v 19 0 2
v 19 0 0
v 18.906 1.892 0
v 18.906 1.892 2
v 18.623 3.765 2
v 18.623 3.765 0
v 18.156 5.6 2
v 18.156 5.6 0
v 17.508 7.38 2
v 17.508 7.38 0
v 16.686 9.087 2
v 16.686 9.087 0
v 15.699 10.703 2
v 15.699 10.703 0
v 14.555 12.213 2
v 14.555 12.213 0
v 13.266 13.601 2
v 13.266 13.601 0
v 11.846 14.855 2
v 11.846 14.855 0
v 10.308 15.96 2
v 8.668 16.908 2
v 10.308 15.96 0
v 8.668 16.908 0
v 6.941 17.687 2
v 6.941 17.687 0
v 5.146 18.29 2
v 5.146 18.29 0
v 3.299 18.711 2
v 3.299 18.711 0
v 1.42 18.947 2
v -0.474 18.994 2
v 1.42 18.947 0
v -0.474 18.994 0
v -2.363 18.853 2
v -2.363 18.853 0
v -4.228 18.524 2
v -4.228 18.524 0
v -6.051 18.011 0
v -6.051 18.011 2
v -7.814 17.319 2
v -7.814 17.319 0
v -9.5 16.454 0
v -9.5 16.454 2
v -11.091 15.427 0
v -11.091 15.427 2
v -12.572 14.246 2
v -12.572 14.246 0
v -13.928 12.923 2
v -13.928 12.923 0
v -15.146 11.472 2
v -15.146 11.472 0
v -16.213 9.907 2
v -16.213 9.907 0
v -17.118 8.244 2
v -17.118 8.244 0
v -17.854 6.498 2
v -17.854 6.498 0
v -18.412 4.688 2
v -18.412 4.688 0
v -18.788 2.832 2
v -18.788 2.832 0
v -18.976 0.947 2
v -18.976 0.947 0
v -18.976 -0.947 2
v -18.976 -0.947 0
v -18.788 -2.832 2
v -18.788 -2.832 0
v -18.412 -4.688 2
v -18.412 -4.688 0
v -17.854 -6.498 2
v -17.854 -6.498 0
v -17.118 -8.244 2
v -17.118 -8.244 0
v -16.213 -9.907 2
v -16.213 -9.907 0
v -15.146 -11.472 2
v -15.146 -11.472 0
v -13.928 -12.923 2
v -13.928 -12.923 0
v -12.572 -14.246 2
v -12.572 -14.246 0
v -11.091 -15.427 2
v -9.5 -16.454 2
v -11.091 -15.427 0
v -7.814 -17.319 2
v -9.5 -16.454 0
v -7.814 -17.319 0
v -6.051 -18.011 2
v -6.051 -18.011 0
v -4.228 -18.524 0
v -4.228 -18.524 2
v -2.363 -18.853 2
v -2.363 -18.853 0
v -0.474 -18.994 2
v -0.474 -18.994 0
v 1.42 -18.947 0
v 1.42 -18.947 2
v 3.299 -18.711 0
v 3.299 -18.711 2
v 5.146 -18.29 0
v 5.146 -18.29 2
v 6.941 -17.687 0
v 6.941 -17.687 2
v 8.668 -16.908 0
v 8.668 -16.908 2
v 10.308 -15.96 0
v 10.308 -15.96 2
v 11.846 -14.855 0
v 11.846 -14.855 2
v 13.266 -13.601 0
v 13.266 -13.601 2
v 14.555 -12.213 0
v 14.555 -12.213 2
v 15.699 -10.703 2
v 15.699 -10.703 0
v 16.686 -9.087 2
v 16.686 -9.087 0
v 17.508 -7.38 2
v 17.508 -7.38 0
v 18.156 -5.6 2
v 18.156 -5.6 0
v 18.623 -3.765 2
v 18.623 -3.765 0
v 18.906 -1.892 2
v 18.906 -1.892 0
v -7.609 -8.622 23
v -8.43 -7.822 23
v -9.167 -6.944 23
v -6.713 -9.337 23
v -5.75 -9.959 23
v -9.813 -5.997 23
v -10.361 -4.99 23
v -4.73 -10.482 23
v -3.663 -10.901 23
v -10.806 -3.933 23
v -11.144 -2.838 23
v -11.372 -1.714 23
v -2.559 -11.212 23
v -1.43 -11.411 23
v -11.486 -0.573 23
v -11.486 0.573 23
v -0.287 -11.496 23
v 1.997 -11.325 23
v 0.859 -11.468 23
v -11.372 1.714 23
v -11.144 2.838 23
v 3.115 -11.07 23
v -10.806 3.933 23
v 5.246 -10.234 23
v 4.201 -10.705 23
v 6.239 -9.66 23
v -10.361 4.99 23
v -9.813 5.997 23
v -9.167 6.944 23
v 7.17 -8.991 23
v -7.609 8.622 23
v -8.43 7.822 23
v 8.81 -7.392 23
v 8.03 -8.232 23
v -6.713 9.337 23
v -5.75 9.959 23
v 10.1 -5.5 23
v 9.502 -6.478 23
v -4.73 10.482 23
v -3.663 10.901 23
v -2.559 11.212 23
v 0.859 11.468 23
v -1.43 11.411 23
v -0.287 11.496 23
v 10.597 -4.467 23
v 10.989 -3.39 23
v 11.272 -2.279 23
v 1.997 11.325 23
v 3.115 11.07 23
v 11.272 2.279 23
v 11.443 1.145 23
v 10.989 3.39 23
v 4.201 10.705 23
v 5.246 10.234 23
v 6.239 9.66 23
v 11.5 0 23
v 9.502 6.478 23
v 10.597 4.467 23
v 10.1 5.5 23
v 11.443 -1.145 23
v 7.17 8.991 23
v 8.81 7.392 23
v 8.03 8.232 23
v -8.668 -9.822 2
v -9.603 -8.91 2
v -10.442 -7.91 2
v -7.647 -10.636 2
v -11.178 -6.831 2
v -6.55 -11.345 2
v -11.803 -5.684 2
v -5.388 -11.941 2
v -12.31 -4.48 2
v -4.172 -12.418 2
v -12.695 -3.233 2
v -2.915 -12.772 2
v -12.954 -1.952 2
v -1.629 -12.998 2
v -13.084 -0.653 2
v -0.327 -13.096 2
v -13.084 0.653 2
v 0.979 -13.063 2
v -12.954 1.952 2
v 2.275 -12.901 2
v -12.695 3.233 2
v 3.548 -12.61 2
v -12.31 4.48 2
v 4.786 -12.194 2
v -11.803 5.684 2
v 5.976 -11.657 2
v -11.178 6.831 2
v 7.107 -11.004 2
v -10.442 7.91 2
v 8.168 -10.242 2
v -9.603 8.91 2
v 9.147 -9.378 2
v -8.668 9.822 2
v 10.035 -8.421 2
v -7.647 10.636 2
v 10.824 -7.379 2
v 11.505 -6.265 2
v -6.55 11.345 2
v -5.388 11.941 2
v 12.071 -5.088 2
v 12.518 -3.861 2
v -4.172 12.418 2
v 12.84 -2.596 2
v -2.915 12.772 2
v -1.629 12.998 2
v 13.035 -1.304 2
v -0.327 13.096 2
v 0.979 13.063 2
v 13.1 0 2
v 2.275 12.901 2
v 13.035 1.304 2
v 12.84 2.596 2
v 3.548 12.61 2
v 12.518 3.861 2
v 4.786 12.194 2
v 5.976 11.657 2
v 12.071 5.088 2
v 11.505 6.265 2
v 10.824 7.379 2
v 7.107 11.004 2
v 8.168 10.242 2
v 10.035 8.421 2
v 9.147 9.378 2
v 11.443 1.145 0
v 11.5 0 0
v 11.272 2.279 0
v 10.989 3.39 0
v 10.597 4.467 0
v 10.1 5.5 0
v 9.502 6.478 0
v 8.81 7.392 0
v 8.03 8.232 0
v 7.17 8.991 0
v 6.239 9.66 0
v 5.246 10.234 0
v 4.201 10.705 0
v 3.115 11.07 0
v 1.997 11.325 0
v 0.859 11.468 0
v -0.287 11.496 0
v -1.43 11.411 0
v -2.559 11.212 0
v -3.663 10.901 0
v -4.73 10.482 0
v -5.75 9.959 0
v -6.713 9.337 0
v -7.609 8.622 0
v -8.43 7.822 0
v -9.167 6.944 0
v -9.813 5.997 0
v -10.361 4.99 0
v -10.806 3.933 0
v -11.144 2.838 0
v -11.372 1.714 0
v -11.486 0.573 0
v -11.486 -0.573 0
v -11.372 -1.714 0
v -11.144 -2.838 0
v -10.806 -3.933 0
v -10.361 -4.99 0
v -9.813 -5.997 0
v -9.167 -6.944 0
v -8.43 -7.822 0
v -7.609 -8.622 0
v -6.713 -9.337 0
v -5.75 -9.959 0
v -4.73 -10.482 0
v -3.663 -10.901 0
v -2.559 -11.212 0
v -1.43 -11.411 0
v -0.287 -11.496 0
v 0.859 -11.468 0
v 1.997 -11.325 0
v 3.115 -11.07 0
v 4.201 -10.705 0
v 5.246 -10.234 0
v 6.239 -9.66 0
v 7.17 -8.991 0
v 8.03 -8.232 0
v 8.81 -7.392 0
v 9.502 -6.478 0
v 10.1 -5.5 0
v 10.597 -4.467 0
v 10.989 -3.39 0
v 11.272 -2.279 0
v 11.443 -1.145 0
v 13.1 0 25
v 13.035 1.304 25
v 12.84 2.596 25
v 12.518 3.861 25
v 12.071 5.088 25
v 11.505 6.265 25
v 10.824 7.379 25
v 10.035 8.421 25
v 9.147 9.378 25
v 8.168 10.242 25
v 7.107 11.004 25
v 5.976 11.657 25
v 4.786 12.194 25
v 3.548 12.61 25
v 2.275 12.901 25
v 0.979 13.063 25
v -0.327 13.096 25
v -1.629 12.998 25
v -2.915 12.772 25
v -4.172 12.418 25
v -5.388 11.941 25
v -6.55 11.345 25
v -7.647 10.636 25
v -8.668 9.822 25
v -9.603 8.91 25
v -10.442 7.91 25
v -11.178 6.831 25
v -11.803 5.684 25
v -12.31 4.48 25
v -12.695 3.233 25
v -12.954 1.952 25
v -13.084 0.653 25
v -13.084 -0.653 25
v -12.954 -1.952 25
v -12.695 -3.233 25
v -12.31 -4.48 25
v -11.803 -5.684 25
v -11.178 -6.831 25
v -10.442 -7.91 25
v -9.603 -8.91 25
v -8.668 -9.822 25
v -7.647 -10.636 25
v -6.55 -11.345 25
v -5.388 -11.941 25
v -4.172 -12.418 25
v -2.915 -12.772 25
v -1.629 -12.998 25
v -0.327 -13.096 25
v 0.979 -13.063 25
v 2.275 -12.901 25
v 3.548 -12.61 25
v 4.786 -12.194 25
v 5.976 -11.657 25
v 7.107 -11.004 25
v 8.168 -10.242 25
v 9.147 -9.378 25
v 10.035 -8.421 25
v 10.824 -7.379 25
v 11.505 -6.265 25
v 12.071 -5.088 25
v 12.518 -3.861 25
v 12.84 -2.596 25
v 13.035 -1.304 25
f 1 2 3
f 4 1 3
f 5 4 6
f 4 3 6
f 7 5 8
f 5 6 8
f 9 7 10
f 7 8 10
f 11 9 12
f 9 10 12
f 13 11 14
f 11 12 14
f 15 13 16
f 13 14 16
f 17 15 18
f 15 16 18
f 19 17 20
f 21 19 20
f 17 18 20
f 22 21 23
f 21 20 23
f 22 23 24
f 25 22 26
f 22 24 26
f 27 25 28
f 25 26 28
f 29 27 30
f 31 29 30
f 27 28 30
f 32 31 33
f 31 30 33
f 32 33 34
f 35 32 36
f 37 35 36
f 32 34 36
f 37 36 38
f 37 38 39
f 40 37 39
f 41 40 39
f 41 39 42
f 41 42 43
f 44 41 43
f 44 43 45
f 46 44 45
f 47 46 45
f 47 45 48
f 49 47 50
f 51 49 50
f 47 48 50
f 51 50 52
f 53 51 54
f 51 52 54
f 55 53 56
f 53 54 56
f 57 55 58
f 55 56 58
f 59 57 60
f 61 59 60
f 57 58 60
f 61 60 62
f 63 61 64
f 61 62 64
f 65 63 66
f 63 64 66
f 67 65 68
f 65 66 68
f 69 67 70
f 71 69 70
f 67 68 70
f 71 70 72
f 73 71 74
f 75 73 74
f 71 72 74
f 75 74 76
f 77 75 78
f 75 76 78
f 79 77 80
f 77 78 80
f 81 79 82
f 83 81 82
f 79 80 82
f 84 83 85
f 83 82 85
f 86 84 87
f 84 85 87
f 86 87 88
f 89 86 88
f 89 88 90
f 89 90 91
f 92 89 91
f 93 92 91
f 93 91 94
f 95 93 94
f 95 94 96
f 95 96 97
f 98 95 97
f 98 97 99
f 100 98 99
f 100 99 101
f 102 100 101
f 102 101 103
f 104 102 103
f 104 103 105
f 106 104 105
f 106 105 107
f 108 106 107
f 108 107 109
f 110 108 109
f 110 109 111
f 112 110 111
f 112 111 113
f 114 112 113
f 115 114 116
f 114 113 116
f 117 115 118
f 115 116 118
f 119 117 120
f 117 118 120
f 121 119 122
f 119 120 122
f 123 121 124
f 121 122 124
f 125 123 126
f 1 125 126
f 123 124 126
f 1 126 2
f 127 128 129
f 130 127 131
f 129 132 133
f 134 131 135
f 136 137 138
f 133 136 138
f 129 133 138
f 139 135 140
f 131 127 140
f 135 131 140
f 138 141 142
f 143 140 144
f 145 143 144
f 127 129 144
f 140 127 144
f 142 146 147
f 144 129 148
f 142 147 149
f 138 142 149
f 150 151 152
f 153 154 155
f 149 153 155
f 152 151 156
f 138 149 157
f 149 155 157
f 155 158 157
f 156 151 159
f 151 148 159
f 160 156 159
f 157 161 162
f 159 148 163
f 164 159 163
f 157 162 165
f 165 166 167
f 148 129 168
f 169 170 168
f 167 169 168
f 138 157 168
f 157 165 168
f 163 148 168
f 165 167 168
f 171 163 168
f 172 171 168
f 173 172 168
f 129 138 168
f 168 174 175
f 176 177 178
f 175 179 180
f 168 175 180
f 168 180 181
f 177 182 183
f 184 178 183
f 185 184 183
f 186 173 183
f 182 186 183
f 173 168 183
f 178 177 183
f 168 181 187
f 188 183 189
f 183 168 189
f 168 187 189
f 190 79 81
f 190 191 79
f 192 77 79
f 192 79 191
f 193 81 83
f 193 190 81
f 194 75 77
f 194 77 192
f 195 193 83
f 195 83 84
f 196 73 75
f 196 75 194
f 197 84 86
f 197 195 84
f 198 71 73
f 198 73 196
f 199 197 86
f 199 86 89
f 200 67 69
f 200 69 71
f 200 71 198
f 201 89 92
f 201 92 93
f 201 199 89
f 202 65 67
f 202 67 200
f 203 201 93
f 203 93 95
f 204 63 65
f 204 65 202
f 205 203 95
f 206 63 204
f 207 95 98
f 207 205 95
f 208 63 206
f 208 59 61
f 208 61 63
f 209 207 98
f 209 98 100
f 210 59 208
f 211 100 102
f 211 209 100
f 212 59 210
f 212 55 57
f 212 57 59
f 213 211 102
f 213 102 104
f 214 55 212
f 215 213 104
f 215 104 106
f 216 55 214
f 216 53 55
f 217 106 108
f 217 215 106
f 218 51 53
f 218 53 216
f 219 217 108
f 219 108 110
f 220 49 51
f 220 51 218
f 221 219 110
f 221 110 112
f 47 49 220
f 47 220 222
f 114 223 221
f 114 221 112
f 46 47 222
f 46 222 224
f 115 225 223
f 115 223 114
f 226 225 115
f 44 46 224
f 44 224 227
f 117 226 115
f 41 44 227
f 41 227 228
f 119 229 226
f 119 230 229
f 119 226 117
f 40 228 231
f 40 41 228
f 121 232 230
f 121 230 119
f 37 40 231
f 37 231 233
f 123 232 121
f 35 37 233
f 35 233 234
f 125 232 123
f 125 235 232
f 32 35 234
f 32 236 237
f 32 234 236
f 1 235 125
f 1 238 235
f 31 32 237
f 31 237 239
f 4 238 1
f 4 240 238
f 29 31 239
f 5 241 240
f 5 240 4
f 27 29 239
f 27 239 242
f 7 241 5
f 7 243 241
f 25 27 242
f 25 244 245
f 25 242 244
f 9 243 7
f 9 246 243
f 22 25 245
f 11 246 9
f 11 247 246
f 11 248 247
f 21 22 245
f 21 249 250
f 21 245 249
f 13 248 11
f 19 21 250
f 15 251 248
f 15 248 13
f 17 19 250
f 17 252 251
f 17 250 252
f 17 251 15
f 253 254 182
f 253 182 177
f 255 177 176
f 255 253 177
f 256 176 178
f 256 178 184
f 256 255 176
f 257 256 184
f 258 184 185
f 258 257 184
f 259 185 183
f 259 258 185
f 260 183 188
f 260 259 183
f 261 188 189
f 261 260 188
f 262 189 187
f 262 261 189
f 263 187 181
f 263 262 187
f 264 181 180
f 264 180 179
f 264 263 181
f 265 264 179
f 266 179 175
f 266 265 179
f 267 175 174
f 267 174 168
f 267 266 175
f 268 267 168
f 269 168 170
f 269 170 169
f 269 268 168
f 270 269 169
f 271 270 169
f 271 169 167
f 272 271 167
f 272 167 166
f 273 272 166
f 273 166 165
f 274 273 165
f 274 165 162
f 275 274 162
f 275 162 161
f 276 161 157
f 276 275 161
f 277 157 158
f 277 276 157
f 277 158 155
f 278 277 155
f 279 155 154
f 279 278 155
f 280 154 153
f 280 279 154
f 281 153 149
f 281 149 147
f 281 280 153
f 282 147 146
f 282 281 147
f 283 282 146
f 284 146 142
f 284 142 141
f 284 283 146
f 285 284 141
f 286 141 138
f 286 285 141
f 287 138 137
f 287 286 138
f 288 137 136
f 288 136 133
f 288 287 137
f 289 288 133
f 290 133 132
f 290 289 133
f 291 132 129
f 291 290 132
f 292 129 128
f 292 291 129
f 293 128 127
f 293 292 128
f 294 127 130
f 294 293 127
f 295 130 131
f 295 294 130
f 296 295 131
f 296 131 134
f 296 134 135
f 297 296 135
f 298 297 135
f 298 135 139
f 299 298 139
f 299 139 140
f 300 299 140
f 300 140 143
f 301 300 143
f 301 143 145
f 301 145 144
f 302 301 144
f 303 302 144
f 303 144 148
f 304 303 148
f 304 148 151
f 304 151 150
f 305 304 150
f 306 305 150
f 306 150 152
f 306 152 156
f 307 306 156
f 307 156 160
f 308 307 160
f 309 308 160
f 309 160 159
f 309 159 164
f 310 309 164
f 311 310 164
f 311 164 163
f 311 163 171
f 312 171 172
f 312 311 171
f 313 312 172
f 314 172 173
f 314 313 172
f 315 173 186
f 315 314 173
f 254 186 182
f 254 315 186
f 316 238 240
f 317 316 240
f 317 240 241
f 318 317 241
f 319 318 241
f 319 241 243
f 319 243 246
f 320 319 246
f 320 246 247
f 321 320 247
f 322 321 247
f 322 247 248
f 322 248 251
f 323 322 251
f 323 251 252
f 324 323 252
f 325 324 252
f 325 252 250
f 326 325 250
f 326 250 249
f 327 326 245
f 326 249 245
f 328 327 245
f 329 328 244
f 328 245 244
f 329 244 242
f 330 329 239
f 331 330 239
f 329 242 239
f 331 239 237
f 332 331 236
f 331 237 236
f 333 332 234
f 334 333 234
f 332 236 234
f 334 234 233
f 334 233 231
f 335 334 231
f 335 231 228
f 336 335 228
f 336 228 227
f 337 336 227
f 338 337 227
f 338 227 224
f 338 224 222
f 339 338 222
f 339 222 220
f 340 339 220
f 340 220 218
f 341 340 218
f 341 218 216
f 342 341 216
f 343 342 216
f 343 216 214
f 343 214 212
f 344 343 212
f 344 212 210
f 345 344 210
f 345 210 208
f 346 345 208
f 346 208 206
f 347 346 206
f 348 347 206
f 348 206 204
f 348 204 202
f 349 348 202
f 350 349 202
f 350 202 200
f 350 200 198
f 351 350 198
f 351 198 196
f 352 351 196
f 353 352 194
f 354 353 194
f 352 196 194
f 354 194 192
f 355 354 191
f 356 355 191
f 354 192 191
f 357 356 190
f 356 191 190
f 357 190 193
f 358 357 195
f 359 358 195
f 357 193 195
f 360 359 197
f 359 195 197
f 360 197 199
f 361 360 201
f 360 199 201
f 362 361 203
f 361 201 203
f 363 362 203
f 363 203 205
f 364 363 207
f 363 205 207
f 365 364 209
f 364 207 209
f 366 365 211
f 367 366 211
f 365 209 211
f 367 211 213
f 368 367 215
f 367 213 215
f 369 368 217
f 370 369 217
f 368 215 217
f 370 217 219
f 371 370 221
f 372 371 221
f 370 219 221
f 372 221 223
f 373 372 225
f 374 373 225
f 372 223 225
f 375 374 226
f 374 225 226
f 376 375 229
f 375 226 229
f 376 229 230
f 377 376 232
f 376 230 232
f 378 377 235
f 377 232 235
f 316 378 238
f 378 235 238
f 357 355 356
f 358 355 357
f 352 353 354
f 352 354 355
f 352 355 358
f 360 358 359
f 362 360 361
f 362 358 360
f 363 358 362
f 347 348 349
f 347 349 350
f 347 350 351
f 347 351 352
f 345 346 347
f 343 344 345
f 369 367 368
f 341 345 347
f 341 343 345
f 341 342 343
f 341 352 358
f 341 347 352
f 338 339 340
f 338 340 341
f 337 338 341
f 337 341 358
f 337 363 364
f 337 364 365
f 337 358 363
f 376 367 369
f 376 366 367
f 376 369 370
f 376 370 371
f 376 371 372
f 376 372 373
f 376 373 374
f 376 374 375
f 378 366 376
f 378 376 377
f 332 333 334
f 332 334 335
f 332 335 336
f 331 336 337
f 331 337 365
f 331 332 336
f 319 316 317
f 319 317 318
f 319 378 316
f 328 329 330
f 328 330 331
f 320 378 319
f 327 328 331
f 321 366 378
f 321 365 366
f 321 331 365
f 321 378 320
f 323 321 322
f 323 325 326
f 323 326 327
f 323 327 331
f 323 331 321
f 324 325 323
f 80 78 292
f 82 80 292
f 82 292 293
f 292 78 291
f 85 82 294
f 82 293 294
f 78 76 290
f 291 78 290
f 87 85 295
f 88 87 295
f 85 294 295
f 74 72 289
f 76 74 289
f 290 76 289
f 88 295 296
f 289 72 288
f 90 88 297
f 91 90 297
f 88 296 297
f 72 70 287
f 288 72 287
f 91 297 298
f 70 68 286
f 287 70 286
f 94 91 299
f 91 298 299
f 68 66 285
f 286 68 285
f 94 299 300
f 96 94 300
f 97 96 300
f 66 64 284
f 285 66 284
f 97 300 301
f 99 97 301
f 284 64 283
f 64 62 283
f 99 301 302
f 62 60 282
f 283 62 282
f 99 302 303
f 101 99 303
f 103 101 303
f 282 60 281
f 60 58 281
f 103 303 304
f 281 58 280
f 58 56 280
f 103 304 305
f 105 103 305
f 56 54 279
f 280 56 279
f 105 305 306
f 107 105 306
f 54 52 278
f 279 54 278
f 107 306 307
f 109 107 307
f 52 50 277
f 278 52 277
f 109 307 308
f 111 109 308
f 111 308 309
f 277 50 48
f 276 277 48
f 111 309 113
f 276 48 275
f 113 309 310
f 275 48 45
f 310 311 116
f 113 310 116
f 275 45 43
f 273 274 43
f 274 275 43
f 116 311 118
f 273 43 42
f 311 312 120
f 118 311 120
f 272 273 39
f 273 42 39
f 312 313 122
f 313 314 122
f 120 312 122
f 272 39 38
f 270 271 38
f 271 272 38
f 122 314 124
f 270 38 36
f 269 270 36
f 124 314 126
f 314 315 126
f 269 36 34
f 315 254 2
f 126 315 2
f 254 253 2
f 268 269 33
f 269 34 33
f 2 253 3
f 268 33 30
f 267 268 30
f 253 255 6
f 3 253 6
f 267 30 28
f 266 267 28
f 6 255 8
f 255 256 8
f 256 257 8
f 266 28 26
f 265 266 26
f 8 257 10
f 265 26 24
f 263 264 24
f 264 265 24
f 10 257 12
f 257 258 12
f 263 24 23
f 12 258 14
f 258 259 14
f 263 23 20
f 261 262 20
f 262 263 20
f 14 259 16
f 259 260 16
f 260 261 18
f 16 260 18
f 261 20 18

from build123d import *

# Parameters (mm, degrees)
F0_R     = 13.1
F0_R_2   = 11.5
F1_DEPTH = 25
F0_R_3   = 19
F2_DEPTH = 2
F3_DEPTH = 23


with BuildPart() as f1:
    # F0 (on Top) → F1 (new body)
    with BuildSketch(Plane.XY):
        Circle(F0_R)
        Circle(F0_R_2, mode=Mode.SUBTRACT)
        Circle(F0_R_2)
    extrude(amount=F1_DEPTH)

    # F0 (on Top) → F2 (join)
    with BuildSketch(Plane.XY):
        Circle(F0_R_3)
        Circle(F0_R, mode=Mode.SUBTRACT)
    extrude(amount=F2_DEPTH)

    # F0 (on Top) → F3 (cut)
    with BuildSketch(Plane.XY):
        Circle(F0_R_2)
    extrude(amount=F3_DEPTH, mode=Mode.SUBTRACT)


solid = f1.part
